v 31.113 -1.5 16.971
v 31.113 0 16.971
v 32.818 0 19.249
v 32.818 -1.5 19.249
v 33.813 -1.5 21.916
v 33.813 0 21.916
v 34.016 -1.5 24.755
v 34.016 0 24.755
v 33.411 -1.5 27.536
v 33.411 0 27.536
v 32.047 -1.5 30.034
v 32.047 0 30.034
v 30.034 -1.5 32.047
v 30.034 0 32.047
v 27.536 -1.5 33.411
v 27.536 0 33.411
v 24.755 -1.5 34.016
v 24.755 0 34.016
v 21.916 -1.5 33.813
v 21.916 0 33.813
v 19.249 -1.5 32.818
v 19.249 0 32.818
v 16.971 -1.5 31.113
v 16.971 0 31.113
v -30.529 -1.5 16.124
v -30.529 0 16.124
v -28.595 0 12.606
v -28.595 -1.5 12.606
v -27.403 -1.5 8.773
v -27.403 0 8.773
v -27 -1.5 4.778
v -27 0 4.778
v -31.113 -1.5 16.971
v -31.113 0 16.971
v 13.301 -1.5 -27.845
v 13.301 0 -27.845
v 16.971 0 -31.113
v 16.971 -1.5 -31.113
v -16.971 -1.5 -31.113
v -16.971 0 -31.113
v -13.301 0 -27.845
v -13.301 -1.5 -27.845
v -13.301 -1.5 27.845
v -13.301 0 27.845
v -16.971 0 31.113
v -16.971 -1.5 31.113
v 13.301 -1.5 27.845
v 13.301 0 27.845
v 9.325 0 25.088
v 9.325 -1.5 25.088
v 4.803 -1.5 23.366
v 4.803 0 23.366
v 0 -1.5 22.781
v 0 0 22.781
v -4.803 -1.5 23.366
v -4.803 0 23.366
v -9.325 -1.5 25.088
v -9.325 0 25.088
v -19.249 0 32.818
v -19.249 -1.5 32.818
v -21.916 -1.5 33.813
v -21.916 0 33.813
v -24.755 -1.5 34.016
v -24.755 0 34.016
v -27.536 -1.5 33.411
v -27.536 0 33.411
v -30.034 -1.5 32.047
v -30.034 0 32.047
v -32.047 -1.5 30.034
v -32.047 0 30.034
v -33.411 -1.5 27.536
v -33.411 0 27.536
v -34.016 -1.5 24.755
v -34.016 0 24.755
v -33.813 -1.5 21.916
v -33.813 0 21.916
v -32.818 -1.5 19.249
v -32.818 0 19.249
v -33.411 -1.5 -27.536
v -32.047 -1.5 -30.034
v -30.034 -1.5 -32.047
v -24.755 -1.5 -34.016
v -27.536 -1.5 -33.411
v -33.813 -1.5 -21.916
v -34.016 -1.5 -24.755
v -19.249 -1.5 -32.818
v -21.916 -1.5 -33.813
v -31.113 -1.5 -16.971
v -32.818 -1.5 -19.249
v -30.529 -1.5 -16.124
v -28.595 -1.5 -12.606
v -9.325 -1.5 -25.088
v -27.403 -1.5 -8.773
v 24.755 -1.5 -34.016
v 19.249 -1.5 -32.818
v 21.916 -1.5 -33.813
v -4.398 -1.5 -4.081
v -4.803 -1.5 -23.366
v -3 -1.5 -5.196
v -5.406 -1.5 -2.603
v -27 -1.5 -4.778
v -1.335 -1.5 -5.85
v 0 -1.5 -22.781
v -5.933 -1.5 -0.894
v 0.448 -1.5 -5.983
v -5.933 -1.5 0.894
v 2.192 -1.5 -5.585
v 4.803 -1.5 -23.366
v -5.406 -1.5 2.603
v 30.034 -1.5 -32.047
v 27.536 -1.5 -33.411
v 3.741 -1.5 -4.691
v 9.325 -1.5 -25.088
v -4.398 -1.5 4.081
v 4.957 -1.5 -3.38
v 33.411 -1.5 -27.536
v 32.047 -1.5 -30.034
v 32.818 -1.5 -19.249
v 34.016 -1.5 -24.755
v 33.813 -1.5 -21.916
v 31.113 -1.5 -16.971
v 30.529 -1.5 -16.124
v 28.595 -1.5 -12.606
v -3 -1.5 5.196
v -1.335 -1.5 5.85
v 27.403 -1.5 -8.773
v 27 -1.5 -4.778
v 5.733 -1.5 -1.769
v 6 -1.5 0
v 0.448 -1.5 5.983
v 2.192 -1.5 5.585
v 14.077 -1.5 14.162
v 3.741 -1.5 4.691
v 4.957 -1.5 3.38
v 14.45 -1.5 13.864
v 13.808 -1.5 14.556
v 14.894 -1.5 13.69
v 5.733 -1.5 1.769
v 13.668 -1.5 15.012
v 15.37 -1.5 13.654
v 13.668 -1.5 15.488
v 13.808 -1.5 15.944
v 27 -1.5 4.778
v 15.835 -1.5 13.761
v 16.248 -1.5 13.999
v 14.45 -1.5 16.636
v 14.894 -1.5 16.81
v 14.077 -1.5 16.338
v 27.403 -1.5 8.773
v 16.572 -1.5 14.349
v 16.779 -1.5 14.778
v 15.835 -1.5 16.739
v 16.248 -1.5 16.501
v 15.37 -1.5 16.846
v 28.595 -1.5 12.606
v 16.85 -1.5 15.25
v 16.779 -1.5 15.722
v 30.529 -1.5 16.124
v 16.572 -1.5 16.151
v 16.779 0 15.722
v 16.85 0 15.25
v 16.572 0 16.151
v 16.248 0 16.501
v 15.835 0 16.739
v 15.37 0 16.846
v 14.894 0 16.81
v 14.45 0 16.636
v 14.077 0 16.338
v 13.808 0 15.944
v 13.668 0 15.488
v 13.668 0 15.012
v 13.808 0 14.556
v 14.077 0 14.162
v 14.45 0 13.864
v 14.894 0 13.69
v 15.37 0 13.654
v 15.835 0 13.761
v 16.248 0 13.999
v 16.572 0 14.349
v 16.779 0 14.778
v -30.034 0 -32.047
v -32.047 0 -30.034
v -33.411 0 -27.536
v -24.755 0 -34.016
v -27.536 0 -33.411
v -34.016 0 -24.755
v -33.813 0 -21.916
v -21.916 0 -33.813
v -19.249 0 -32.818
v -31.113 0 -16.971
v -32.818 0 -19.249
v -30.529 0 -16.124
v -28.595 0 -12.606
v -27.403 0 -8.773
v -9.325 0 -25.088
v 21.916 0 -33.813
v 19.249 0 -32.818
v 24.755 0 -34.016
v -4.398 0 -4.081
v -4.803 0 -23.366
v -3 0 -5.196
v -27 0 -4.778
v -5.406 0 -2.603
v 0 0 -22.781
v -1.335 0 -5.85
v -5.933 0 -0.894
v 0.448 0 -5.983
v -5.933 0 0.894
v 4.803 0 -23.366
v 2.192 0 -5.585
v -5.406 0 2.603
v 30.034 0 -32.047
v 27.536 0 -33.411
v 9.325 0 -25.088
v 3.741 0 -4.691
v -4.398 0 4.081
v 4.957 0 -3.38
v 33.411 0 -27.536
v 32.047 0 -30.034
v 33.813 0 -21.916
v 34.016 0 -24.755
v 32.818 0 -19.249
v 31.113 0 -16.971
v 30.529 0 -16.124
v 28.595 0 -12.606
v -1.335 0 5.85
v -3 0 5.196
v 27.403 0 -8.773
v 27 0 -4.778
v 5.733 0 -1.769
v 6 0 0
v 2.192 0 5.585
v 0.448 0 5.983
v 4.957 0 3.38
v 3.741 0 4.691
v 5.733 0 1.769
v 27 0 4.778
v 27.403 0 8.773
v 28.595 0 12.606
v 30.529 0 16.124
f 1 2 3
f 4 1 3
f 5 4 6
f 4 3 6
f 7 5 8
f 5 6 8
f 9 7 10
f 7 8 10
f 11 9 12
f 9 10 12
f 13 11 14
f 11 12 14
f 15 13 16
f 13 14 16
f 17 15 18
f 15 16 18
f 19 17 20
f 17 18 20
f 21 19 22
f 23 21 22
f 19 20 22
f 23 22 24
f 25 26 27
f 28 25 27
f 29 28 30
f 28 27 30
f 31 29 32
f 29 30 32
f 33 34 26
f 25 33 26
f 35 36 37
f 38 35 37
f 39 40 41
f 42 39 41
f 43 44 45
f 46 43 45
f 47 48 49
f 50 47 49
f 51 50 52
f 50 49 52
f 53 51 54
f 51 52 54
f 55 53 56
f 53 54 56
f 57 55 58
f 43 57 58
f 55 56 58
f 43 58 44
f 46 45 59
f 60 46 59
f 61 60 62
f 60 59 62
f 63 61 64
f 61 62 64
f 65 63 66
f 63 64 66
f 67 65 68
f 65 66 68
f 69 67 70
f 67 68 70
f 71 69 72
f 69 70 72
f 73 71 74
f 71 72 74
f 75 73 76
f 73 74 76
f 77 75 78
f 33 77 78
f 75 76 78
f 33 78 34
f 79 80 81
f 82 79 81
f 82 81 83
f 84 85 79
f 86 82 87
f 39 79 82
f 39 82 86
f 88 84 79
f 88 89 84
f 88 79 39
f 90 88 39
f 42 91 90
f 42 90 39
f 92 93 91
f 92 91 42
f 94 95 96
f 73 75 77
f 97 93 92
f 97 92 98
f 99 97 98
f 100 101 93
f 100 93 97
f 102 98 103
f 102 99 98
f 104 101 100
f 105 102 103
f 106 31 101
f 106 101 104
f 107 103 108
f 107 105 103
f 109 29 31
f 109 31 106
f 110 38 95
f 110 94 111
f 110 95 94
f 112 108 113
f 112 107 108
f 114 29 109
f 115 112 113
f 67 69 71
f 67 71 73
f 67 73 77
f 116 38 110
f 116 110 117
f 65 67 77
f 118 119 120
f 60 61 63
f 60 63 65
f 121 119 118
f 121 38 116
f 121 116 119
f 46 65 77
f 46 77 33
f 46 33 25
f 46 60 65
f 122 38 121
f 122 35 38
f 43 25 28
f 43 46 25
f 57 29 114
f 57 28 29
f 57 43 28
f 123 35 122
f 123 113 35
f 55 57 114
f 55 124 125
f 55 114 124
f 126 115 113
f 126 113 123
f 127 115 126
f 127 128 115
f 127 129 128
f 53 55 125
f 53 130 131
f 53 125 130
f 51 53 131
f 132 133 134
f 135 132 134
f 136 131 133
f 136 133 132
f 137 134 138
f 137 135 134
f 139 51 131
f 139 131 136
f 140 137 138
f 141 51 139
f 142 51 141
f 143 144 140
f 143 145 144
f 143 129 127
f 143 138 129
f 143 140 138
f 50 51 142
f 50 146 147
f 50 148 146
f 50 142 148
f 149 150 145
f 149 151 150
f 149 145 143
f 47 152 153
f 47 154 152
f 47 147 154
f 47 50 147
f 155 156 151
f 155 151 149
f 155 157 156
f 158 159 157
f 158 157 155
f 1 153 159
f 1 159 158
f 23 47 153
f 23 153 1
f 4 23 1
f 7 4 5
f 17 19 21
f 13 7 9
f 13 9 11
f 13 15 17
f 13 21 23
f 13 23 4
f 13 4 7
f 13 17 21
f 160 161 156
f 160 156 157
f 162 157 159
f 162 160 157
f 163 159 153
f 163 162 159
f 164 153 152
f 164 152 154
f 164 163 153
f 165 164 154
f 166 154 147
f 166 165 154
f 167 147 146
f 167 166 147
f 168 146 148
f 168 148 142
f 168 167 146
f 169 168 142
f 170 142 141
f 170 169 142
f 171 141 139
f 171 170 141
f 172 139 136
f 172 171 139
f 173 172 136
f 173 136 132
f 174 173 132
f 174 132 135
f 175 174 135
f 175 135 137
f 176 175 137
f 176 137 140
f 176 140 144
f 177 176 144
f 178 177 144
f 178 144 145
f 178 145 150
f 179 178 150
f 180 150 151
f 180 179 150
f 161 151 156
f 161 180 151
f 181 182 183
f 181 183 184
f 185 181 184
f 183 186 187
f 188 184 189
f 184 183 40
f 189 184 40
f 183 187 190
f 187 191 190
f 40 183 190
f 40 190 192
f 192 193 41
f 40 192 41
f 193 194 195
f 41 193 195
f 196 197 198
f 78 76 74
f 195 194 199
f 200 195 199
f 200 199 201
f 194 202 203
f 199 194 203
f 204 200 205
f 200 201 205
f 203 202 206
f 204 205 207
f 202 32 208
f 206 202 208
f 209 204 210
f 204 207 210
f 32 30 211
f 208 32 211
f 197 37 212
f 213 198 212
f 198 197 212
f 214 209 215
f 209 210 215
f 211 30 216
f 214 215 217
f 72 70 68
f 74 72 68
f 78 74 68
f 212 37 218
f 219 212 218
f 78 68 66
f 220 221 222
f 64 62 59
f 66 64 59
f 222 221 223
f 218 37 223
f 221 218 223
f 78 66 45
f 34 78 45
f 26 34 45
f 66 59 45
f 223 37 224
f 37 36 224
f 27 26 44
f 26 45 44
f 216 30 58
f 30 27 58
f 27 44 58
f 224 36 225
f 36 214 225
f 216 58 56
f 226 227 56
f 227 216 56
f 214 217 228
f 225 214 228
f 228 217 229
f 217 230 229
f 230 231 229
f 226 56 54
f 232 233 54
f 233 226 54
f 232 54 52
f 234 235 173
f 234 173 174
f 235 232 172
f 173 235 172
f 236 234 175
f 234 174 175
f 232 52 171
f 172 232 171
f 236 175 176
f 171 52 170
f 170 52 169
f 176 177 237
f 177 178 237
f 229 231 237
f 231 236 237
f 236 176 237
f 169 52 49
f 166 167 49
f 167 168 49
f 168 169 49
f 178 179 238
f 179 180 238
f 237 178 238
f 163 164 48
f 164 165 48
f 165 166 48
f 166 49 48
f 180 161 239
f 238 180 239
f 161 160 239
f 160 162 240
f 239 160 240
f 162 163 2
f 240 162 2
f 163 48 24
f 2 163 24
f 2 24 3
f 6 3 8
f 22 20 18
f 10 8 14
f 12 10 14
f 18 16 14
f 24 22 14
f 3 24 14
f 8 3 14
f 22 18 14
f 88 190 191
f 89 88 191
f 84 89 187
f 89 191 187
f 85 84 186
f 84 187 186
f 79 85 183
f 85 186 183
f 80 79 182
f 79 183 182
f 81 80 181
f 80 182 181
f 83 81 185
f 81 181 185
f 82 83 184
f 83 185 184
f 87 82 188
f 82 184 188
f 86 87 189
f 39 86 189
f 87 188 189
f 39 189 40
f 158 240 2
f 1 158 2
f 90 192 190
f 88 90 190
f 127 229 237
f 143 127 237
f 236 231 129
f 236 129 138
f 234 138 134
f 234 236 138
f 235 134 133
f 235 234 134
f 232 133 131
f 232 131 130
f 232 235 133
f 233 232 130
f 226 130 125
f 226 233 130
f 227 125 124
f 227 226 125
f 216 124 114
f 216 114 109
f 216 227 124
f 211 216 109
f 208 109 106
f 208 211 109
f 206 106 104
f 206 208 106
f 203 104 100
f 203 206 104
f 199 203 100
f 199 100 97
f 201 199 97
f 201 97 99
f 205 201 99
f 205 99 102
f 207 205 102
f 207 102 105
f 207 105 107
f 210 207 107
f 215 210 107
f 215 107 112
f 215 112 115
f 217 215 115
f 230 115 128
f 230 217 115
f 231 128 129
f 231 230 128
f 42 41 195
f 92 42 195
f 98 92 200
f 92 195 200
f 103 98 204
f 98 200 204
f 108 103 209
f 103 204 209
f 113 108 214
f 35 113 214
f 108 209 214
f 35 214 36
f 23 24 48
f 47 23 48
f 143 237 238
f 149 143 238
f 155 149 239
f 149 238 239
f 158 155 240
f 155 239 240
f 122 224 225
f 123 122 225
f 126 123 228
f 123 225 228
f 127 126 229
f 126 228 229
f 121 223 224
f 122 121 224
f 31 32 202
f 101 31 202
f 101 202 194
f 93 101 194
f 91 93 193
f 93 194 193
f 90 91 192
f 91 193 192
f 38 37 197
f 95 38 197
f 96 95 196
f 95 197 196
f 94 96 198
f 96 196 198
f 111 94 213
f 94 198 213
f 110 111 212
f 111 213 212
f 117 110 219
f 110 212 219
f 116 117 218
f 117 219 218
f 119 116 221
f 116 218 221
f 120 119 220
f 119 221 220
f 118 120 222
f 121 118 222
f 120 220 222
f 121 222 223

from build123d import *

# Parameters (mm, degrees)
F0_R     = 6
F0_R_2   = 1.6
F1_DEPTH = 1.5


with BuildPart() as f1:
    # F0 (on Front) → F1 (new body)
    with BuildSketch(Plane.XZ):
        with BuildLine():
            ThreePointArc((31.112698, 16.970563), (31.112698, 31.112698), (16.970563, 31.112698))
            Line((16.970563, 31.112698), (13.300916, 27.844789))
            ThreePointArc((13.300916, 27.844789), (0, 22.78084), (-13.300916, 27.844789))
            Line((-13.300916, 27.844789), (-16.970563, 31.112698))
            ThreePointArc((-16.970563, 31.112698), (-31.112698, 31.112698), (-31.112698, 16.970563))
            Line((-31.112698, 16.970563), (-30.529389, 16.12375))
            ThreePointArc((-30.529389, 16.12375), (-27.90272, 10.719178), (-27, 4.778312))
            Line((-27, 4.778312), (-27, -4.778312))
            ThreePointArc((-27, -4.778312), (-27.90272, -10.719178), (-30.529389, -16.12375))
            Line((-30.529389, -16.12375), (-31.112698, -16.970563))
            ThreePointArc((-31.112698, -16.970563), (-31.112698, -31.112698), (-16.970563, -31.112698))
            Line((-16.970563, -31.112698), (-13.300916, -27.844789))
            ThreePointArc((-13.300916, -27.844789), (0, -22.78084), (13.300916, -27.844789))
            Line((13.300916, -27.844789), (16.970563, -31.112698))
            ThreePointArc((16.970563, -31.112698), (31.112698, -31.112698), (31.112698, -16.970563))
            Line((31.112698, -16.970563), (30.529389, -16.12375))
            ThreePointArc((30.529389, -16.12375), (27.90272, -10.719178), (27, -4.778312))
            Line((27, -4.778312), (27, 4.778312))
            ThreePointArc((27, 4.778312), (27.90272, 10.719178), (30.529389, 16.12375))
            Line((30.529389, 16.12375), (31.112698, 16.970563))
        make_face()
        Circle(F0_R, mode=Mode.SUBTRACT)
        with Locations((15.25, 15.25)):
            Circle(F0_R_2, mode=Mode.SUBTRACT)
    extrude(amount=F1_DEPTH)


solid = f1.part
